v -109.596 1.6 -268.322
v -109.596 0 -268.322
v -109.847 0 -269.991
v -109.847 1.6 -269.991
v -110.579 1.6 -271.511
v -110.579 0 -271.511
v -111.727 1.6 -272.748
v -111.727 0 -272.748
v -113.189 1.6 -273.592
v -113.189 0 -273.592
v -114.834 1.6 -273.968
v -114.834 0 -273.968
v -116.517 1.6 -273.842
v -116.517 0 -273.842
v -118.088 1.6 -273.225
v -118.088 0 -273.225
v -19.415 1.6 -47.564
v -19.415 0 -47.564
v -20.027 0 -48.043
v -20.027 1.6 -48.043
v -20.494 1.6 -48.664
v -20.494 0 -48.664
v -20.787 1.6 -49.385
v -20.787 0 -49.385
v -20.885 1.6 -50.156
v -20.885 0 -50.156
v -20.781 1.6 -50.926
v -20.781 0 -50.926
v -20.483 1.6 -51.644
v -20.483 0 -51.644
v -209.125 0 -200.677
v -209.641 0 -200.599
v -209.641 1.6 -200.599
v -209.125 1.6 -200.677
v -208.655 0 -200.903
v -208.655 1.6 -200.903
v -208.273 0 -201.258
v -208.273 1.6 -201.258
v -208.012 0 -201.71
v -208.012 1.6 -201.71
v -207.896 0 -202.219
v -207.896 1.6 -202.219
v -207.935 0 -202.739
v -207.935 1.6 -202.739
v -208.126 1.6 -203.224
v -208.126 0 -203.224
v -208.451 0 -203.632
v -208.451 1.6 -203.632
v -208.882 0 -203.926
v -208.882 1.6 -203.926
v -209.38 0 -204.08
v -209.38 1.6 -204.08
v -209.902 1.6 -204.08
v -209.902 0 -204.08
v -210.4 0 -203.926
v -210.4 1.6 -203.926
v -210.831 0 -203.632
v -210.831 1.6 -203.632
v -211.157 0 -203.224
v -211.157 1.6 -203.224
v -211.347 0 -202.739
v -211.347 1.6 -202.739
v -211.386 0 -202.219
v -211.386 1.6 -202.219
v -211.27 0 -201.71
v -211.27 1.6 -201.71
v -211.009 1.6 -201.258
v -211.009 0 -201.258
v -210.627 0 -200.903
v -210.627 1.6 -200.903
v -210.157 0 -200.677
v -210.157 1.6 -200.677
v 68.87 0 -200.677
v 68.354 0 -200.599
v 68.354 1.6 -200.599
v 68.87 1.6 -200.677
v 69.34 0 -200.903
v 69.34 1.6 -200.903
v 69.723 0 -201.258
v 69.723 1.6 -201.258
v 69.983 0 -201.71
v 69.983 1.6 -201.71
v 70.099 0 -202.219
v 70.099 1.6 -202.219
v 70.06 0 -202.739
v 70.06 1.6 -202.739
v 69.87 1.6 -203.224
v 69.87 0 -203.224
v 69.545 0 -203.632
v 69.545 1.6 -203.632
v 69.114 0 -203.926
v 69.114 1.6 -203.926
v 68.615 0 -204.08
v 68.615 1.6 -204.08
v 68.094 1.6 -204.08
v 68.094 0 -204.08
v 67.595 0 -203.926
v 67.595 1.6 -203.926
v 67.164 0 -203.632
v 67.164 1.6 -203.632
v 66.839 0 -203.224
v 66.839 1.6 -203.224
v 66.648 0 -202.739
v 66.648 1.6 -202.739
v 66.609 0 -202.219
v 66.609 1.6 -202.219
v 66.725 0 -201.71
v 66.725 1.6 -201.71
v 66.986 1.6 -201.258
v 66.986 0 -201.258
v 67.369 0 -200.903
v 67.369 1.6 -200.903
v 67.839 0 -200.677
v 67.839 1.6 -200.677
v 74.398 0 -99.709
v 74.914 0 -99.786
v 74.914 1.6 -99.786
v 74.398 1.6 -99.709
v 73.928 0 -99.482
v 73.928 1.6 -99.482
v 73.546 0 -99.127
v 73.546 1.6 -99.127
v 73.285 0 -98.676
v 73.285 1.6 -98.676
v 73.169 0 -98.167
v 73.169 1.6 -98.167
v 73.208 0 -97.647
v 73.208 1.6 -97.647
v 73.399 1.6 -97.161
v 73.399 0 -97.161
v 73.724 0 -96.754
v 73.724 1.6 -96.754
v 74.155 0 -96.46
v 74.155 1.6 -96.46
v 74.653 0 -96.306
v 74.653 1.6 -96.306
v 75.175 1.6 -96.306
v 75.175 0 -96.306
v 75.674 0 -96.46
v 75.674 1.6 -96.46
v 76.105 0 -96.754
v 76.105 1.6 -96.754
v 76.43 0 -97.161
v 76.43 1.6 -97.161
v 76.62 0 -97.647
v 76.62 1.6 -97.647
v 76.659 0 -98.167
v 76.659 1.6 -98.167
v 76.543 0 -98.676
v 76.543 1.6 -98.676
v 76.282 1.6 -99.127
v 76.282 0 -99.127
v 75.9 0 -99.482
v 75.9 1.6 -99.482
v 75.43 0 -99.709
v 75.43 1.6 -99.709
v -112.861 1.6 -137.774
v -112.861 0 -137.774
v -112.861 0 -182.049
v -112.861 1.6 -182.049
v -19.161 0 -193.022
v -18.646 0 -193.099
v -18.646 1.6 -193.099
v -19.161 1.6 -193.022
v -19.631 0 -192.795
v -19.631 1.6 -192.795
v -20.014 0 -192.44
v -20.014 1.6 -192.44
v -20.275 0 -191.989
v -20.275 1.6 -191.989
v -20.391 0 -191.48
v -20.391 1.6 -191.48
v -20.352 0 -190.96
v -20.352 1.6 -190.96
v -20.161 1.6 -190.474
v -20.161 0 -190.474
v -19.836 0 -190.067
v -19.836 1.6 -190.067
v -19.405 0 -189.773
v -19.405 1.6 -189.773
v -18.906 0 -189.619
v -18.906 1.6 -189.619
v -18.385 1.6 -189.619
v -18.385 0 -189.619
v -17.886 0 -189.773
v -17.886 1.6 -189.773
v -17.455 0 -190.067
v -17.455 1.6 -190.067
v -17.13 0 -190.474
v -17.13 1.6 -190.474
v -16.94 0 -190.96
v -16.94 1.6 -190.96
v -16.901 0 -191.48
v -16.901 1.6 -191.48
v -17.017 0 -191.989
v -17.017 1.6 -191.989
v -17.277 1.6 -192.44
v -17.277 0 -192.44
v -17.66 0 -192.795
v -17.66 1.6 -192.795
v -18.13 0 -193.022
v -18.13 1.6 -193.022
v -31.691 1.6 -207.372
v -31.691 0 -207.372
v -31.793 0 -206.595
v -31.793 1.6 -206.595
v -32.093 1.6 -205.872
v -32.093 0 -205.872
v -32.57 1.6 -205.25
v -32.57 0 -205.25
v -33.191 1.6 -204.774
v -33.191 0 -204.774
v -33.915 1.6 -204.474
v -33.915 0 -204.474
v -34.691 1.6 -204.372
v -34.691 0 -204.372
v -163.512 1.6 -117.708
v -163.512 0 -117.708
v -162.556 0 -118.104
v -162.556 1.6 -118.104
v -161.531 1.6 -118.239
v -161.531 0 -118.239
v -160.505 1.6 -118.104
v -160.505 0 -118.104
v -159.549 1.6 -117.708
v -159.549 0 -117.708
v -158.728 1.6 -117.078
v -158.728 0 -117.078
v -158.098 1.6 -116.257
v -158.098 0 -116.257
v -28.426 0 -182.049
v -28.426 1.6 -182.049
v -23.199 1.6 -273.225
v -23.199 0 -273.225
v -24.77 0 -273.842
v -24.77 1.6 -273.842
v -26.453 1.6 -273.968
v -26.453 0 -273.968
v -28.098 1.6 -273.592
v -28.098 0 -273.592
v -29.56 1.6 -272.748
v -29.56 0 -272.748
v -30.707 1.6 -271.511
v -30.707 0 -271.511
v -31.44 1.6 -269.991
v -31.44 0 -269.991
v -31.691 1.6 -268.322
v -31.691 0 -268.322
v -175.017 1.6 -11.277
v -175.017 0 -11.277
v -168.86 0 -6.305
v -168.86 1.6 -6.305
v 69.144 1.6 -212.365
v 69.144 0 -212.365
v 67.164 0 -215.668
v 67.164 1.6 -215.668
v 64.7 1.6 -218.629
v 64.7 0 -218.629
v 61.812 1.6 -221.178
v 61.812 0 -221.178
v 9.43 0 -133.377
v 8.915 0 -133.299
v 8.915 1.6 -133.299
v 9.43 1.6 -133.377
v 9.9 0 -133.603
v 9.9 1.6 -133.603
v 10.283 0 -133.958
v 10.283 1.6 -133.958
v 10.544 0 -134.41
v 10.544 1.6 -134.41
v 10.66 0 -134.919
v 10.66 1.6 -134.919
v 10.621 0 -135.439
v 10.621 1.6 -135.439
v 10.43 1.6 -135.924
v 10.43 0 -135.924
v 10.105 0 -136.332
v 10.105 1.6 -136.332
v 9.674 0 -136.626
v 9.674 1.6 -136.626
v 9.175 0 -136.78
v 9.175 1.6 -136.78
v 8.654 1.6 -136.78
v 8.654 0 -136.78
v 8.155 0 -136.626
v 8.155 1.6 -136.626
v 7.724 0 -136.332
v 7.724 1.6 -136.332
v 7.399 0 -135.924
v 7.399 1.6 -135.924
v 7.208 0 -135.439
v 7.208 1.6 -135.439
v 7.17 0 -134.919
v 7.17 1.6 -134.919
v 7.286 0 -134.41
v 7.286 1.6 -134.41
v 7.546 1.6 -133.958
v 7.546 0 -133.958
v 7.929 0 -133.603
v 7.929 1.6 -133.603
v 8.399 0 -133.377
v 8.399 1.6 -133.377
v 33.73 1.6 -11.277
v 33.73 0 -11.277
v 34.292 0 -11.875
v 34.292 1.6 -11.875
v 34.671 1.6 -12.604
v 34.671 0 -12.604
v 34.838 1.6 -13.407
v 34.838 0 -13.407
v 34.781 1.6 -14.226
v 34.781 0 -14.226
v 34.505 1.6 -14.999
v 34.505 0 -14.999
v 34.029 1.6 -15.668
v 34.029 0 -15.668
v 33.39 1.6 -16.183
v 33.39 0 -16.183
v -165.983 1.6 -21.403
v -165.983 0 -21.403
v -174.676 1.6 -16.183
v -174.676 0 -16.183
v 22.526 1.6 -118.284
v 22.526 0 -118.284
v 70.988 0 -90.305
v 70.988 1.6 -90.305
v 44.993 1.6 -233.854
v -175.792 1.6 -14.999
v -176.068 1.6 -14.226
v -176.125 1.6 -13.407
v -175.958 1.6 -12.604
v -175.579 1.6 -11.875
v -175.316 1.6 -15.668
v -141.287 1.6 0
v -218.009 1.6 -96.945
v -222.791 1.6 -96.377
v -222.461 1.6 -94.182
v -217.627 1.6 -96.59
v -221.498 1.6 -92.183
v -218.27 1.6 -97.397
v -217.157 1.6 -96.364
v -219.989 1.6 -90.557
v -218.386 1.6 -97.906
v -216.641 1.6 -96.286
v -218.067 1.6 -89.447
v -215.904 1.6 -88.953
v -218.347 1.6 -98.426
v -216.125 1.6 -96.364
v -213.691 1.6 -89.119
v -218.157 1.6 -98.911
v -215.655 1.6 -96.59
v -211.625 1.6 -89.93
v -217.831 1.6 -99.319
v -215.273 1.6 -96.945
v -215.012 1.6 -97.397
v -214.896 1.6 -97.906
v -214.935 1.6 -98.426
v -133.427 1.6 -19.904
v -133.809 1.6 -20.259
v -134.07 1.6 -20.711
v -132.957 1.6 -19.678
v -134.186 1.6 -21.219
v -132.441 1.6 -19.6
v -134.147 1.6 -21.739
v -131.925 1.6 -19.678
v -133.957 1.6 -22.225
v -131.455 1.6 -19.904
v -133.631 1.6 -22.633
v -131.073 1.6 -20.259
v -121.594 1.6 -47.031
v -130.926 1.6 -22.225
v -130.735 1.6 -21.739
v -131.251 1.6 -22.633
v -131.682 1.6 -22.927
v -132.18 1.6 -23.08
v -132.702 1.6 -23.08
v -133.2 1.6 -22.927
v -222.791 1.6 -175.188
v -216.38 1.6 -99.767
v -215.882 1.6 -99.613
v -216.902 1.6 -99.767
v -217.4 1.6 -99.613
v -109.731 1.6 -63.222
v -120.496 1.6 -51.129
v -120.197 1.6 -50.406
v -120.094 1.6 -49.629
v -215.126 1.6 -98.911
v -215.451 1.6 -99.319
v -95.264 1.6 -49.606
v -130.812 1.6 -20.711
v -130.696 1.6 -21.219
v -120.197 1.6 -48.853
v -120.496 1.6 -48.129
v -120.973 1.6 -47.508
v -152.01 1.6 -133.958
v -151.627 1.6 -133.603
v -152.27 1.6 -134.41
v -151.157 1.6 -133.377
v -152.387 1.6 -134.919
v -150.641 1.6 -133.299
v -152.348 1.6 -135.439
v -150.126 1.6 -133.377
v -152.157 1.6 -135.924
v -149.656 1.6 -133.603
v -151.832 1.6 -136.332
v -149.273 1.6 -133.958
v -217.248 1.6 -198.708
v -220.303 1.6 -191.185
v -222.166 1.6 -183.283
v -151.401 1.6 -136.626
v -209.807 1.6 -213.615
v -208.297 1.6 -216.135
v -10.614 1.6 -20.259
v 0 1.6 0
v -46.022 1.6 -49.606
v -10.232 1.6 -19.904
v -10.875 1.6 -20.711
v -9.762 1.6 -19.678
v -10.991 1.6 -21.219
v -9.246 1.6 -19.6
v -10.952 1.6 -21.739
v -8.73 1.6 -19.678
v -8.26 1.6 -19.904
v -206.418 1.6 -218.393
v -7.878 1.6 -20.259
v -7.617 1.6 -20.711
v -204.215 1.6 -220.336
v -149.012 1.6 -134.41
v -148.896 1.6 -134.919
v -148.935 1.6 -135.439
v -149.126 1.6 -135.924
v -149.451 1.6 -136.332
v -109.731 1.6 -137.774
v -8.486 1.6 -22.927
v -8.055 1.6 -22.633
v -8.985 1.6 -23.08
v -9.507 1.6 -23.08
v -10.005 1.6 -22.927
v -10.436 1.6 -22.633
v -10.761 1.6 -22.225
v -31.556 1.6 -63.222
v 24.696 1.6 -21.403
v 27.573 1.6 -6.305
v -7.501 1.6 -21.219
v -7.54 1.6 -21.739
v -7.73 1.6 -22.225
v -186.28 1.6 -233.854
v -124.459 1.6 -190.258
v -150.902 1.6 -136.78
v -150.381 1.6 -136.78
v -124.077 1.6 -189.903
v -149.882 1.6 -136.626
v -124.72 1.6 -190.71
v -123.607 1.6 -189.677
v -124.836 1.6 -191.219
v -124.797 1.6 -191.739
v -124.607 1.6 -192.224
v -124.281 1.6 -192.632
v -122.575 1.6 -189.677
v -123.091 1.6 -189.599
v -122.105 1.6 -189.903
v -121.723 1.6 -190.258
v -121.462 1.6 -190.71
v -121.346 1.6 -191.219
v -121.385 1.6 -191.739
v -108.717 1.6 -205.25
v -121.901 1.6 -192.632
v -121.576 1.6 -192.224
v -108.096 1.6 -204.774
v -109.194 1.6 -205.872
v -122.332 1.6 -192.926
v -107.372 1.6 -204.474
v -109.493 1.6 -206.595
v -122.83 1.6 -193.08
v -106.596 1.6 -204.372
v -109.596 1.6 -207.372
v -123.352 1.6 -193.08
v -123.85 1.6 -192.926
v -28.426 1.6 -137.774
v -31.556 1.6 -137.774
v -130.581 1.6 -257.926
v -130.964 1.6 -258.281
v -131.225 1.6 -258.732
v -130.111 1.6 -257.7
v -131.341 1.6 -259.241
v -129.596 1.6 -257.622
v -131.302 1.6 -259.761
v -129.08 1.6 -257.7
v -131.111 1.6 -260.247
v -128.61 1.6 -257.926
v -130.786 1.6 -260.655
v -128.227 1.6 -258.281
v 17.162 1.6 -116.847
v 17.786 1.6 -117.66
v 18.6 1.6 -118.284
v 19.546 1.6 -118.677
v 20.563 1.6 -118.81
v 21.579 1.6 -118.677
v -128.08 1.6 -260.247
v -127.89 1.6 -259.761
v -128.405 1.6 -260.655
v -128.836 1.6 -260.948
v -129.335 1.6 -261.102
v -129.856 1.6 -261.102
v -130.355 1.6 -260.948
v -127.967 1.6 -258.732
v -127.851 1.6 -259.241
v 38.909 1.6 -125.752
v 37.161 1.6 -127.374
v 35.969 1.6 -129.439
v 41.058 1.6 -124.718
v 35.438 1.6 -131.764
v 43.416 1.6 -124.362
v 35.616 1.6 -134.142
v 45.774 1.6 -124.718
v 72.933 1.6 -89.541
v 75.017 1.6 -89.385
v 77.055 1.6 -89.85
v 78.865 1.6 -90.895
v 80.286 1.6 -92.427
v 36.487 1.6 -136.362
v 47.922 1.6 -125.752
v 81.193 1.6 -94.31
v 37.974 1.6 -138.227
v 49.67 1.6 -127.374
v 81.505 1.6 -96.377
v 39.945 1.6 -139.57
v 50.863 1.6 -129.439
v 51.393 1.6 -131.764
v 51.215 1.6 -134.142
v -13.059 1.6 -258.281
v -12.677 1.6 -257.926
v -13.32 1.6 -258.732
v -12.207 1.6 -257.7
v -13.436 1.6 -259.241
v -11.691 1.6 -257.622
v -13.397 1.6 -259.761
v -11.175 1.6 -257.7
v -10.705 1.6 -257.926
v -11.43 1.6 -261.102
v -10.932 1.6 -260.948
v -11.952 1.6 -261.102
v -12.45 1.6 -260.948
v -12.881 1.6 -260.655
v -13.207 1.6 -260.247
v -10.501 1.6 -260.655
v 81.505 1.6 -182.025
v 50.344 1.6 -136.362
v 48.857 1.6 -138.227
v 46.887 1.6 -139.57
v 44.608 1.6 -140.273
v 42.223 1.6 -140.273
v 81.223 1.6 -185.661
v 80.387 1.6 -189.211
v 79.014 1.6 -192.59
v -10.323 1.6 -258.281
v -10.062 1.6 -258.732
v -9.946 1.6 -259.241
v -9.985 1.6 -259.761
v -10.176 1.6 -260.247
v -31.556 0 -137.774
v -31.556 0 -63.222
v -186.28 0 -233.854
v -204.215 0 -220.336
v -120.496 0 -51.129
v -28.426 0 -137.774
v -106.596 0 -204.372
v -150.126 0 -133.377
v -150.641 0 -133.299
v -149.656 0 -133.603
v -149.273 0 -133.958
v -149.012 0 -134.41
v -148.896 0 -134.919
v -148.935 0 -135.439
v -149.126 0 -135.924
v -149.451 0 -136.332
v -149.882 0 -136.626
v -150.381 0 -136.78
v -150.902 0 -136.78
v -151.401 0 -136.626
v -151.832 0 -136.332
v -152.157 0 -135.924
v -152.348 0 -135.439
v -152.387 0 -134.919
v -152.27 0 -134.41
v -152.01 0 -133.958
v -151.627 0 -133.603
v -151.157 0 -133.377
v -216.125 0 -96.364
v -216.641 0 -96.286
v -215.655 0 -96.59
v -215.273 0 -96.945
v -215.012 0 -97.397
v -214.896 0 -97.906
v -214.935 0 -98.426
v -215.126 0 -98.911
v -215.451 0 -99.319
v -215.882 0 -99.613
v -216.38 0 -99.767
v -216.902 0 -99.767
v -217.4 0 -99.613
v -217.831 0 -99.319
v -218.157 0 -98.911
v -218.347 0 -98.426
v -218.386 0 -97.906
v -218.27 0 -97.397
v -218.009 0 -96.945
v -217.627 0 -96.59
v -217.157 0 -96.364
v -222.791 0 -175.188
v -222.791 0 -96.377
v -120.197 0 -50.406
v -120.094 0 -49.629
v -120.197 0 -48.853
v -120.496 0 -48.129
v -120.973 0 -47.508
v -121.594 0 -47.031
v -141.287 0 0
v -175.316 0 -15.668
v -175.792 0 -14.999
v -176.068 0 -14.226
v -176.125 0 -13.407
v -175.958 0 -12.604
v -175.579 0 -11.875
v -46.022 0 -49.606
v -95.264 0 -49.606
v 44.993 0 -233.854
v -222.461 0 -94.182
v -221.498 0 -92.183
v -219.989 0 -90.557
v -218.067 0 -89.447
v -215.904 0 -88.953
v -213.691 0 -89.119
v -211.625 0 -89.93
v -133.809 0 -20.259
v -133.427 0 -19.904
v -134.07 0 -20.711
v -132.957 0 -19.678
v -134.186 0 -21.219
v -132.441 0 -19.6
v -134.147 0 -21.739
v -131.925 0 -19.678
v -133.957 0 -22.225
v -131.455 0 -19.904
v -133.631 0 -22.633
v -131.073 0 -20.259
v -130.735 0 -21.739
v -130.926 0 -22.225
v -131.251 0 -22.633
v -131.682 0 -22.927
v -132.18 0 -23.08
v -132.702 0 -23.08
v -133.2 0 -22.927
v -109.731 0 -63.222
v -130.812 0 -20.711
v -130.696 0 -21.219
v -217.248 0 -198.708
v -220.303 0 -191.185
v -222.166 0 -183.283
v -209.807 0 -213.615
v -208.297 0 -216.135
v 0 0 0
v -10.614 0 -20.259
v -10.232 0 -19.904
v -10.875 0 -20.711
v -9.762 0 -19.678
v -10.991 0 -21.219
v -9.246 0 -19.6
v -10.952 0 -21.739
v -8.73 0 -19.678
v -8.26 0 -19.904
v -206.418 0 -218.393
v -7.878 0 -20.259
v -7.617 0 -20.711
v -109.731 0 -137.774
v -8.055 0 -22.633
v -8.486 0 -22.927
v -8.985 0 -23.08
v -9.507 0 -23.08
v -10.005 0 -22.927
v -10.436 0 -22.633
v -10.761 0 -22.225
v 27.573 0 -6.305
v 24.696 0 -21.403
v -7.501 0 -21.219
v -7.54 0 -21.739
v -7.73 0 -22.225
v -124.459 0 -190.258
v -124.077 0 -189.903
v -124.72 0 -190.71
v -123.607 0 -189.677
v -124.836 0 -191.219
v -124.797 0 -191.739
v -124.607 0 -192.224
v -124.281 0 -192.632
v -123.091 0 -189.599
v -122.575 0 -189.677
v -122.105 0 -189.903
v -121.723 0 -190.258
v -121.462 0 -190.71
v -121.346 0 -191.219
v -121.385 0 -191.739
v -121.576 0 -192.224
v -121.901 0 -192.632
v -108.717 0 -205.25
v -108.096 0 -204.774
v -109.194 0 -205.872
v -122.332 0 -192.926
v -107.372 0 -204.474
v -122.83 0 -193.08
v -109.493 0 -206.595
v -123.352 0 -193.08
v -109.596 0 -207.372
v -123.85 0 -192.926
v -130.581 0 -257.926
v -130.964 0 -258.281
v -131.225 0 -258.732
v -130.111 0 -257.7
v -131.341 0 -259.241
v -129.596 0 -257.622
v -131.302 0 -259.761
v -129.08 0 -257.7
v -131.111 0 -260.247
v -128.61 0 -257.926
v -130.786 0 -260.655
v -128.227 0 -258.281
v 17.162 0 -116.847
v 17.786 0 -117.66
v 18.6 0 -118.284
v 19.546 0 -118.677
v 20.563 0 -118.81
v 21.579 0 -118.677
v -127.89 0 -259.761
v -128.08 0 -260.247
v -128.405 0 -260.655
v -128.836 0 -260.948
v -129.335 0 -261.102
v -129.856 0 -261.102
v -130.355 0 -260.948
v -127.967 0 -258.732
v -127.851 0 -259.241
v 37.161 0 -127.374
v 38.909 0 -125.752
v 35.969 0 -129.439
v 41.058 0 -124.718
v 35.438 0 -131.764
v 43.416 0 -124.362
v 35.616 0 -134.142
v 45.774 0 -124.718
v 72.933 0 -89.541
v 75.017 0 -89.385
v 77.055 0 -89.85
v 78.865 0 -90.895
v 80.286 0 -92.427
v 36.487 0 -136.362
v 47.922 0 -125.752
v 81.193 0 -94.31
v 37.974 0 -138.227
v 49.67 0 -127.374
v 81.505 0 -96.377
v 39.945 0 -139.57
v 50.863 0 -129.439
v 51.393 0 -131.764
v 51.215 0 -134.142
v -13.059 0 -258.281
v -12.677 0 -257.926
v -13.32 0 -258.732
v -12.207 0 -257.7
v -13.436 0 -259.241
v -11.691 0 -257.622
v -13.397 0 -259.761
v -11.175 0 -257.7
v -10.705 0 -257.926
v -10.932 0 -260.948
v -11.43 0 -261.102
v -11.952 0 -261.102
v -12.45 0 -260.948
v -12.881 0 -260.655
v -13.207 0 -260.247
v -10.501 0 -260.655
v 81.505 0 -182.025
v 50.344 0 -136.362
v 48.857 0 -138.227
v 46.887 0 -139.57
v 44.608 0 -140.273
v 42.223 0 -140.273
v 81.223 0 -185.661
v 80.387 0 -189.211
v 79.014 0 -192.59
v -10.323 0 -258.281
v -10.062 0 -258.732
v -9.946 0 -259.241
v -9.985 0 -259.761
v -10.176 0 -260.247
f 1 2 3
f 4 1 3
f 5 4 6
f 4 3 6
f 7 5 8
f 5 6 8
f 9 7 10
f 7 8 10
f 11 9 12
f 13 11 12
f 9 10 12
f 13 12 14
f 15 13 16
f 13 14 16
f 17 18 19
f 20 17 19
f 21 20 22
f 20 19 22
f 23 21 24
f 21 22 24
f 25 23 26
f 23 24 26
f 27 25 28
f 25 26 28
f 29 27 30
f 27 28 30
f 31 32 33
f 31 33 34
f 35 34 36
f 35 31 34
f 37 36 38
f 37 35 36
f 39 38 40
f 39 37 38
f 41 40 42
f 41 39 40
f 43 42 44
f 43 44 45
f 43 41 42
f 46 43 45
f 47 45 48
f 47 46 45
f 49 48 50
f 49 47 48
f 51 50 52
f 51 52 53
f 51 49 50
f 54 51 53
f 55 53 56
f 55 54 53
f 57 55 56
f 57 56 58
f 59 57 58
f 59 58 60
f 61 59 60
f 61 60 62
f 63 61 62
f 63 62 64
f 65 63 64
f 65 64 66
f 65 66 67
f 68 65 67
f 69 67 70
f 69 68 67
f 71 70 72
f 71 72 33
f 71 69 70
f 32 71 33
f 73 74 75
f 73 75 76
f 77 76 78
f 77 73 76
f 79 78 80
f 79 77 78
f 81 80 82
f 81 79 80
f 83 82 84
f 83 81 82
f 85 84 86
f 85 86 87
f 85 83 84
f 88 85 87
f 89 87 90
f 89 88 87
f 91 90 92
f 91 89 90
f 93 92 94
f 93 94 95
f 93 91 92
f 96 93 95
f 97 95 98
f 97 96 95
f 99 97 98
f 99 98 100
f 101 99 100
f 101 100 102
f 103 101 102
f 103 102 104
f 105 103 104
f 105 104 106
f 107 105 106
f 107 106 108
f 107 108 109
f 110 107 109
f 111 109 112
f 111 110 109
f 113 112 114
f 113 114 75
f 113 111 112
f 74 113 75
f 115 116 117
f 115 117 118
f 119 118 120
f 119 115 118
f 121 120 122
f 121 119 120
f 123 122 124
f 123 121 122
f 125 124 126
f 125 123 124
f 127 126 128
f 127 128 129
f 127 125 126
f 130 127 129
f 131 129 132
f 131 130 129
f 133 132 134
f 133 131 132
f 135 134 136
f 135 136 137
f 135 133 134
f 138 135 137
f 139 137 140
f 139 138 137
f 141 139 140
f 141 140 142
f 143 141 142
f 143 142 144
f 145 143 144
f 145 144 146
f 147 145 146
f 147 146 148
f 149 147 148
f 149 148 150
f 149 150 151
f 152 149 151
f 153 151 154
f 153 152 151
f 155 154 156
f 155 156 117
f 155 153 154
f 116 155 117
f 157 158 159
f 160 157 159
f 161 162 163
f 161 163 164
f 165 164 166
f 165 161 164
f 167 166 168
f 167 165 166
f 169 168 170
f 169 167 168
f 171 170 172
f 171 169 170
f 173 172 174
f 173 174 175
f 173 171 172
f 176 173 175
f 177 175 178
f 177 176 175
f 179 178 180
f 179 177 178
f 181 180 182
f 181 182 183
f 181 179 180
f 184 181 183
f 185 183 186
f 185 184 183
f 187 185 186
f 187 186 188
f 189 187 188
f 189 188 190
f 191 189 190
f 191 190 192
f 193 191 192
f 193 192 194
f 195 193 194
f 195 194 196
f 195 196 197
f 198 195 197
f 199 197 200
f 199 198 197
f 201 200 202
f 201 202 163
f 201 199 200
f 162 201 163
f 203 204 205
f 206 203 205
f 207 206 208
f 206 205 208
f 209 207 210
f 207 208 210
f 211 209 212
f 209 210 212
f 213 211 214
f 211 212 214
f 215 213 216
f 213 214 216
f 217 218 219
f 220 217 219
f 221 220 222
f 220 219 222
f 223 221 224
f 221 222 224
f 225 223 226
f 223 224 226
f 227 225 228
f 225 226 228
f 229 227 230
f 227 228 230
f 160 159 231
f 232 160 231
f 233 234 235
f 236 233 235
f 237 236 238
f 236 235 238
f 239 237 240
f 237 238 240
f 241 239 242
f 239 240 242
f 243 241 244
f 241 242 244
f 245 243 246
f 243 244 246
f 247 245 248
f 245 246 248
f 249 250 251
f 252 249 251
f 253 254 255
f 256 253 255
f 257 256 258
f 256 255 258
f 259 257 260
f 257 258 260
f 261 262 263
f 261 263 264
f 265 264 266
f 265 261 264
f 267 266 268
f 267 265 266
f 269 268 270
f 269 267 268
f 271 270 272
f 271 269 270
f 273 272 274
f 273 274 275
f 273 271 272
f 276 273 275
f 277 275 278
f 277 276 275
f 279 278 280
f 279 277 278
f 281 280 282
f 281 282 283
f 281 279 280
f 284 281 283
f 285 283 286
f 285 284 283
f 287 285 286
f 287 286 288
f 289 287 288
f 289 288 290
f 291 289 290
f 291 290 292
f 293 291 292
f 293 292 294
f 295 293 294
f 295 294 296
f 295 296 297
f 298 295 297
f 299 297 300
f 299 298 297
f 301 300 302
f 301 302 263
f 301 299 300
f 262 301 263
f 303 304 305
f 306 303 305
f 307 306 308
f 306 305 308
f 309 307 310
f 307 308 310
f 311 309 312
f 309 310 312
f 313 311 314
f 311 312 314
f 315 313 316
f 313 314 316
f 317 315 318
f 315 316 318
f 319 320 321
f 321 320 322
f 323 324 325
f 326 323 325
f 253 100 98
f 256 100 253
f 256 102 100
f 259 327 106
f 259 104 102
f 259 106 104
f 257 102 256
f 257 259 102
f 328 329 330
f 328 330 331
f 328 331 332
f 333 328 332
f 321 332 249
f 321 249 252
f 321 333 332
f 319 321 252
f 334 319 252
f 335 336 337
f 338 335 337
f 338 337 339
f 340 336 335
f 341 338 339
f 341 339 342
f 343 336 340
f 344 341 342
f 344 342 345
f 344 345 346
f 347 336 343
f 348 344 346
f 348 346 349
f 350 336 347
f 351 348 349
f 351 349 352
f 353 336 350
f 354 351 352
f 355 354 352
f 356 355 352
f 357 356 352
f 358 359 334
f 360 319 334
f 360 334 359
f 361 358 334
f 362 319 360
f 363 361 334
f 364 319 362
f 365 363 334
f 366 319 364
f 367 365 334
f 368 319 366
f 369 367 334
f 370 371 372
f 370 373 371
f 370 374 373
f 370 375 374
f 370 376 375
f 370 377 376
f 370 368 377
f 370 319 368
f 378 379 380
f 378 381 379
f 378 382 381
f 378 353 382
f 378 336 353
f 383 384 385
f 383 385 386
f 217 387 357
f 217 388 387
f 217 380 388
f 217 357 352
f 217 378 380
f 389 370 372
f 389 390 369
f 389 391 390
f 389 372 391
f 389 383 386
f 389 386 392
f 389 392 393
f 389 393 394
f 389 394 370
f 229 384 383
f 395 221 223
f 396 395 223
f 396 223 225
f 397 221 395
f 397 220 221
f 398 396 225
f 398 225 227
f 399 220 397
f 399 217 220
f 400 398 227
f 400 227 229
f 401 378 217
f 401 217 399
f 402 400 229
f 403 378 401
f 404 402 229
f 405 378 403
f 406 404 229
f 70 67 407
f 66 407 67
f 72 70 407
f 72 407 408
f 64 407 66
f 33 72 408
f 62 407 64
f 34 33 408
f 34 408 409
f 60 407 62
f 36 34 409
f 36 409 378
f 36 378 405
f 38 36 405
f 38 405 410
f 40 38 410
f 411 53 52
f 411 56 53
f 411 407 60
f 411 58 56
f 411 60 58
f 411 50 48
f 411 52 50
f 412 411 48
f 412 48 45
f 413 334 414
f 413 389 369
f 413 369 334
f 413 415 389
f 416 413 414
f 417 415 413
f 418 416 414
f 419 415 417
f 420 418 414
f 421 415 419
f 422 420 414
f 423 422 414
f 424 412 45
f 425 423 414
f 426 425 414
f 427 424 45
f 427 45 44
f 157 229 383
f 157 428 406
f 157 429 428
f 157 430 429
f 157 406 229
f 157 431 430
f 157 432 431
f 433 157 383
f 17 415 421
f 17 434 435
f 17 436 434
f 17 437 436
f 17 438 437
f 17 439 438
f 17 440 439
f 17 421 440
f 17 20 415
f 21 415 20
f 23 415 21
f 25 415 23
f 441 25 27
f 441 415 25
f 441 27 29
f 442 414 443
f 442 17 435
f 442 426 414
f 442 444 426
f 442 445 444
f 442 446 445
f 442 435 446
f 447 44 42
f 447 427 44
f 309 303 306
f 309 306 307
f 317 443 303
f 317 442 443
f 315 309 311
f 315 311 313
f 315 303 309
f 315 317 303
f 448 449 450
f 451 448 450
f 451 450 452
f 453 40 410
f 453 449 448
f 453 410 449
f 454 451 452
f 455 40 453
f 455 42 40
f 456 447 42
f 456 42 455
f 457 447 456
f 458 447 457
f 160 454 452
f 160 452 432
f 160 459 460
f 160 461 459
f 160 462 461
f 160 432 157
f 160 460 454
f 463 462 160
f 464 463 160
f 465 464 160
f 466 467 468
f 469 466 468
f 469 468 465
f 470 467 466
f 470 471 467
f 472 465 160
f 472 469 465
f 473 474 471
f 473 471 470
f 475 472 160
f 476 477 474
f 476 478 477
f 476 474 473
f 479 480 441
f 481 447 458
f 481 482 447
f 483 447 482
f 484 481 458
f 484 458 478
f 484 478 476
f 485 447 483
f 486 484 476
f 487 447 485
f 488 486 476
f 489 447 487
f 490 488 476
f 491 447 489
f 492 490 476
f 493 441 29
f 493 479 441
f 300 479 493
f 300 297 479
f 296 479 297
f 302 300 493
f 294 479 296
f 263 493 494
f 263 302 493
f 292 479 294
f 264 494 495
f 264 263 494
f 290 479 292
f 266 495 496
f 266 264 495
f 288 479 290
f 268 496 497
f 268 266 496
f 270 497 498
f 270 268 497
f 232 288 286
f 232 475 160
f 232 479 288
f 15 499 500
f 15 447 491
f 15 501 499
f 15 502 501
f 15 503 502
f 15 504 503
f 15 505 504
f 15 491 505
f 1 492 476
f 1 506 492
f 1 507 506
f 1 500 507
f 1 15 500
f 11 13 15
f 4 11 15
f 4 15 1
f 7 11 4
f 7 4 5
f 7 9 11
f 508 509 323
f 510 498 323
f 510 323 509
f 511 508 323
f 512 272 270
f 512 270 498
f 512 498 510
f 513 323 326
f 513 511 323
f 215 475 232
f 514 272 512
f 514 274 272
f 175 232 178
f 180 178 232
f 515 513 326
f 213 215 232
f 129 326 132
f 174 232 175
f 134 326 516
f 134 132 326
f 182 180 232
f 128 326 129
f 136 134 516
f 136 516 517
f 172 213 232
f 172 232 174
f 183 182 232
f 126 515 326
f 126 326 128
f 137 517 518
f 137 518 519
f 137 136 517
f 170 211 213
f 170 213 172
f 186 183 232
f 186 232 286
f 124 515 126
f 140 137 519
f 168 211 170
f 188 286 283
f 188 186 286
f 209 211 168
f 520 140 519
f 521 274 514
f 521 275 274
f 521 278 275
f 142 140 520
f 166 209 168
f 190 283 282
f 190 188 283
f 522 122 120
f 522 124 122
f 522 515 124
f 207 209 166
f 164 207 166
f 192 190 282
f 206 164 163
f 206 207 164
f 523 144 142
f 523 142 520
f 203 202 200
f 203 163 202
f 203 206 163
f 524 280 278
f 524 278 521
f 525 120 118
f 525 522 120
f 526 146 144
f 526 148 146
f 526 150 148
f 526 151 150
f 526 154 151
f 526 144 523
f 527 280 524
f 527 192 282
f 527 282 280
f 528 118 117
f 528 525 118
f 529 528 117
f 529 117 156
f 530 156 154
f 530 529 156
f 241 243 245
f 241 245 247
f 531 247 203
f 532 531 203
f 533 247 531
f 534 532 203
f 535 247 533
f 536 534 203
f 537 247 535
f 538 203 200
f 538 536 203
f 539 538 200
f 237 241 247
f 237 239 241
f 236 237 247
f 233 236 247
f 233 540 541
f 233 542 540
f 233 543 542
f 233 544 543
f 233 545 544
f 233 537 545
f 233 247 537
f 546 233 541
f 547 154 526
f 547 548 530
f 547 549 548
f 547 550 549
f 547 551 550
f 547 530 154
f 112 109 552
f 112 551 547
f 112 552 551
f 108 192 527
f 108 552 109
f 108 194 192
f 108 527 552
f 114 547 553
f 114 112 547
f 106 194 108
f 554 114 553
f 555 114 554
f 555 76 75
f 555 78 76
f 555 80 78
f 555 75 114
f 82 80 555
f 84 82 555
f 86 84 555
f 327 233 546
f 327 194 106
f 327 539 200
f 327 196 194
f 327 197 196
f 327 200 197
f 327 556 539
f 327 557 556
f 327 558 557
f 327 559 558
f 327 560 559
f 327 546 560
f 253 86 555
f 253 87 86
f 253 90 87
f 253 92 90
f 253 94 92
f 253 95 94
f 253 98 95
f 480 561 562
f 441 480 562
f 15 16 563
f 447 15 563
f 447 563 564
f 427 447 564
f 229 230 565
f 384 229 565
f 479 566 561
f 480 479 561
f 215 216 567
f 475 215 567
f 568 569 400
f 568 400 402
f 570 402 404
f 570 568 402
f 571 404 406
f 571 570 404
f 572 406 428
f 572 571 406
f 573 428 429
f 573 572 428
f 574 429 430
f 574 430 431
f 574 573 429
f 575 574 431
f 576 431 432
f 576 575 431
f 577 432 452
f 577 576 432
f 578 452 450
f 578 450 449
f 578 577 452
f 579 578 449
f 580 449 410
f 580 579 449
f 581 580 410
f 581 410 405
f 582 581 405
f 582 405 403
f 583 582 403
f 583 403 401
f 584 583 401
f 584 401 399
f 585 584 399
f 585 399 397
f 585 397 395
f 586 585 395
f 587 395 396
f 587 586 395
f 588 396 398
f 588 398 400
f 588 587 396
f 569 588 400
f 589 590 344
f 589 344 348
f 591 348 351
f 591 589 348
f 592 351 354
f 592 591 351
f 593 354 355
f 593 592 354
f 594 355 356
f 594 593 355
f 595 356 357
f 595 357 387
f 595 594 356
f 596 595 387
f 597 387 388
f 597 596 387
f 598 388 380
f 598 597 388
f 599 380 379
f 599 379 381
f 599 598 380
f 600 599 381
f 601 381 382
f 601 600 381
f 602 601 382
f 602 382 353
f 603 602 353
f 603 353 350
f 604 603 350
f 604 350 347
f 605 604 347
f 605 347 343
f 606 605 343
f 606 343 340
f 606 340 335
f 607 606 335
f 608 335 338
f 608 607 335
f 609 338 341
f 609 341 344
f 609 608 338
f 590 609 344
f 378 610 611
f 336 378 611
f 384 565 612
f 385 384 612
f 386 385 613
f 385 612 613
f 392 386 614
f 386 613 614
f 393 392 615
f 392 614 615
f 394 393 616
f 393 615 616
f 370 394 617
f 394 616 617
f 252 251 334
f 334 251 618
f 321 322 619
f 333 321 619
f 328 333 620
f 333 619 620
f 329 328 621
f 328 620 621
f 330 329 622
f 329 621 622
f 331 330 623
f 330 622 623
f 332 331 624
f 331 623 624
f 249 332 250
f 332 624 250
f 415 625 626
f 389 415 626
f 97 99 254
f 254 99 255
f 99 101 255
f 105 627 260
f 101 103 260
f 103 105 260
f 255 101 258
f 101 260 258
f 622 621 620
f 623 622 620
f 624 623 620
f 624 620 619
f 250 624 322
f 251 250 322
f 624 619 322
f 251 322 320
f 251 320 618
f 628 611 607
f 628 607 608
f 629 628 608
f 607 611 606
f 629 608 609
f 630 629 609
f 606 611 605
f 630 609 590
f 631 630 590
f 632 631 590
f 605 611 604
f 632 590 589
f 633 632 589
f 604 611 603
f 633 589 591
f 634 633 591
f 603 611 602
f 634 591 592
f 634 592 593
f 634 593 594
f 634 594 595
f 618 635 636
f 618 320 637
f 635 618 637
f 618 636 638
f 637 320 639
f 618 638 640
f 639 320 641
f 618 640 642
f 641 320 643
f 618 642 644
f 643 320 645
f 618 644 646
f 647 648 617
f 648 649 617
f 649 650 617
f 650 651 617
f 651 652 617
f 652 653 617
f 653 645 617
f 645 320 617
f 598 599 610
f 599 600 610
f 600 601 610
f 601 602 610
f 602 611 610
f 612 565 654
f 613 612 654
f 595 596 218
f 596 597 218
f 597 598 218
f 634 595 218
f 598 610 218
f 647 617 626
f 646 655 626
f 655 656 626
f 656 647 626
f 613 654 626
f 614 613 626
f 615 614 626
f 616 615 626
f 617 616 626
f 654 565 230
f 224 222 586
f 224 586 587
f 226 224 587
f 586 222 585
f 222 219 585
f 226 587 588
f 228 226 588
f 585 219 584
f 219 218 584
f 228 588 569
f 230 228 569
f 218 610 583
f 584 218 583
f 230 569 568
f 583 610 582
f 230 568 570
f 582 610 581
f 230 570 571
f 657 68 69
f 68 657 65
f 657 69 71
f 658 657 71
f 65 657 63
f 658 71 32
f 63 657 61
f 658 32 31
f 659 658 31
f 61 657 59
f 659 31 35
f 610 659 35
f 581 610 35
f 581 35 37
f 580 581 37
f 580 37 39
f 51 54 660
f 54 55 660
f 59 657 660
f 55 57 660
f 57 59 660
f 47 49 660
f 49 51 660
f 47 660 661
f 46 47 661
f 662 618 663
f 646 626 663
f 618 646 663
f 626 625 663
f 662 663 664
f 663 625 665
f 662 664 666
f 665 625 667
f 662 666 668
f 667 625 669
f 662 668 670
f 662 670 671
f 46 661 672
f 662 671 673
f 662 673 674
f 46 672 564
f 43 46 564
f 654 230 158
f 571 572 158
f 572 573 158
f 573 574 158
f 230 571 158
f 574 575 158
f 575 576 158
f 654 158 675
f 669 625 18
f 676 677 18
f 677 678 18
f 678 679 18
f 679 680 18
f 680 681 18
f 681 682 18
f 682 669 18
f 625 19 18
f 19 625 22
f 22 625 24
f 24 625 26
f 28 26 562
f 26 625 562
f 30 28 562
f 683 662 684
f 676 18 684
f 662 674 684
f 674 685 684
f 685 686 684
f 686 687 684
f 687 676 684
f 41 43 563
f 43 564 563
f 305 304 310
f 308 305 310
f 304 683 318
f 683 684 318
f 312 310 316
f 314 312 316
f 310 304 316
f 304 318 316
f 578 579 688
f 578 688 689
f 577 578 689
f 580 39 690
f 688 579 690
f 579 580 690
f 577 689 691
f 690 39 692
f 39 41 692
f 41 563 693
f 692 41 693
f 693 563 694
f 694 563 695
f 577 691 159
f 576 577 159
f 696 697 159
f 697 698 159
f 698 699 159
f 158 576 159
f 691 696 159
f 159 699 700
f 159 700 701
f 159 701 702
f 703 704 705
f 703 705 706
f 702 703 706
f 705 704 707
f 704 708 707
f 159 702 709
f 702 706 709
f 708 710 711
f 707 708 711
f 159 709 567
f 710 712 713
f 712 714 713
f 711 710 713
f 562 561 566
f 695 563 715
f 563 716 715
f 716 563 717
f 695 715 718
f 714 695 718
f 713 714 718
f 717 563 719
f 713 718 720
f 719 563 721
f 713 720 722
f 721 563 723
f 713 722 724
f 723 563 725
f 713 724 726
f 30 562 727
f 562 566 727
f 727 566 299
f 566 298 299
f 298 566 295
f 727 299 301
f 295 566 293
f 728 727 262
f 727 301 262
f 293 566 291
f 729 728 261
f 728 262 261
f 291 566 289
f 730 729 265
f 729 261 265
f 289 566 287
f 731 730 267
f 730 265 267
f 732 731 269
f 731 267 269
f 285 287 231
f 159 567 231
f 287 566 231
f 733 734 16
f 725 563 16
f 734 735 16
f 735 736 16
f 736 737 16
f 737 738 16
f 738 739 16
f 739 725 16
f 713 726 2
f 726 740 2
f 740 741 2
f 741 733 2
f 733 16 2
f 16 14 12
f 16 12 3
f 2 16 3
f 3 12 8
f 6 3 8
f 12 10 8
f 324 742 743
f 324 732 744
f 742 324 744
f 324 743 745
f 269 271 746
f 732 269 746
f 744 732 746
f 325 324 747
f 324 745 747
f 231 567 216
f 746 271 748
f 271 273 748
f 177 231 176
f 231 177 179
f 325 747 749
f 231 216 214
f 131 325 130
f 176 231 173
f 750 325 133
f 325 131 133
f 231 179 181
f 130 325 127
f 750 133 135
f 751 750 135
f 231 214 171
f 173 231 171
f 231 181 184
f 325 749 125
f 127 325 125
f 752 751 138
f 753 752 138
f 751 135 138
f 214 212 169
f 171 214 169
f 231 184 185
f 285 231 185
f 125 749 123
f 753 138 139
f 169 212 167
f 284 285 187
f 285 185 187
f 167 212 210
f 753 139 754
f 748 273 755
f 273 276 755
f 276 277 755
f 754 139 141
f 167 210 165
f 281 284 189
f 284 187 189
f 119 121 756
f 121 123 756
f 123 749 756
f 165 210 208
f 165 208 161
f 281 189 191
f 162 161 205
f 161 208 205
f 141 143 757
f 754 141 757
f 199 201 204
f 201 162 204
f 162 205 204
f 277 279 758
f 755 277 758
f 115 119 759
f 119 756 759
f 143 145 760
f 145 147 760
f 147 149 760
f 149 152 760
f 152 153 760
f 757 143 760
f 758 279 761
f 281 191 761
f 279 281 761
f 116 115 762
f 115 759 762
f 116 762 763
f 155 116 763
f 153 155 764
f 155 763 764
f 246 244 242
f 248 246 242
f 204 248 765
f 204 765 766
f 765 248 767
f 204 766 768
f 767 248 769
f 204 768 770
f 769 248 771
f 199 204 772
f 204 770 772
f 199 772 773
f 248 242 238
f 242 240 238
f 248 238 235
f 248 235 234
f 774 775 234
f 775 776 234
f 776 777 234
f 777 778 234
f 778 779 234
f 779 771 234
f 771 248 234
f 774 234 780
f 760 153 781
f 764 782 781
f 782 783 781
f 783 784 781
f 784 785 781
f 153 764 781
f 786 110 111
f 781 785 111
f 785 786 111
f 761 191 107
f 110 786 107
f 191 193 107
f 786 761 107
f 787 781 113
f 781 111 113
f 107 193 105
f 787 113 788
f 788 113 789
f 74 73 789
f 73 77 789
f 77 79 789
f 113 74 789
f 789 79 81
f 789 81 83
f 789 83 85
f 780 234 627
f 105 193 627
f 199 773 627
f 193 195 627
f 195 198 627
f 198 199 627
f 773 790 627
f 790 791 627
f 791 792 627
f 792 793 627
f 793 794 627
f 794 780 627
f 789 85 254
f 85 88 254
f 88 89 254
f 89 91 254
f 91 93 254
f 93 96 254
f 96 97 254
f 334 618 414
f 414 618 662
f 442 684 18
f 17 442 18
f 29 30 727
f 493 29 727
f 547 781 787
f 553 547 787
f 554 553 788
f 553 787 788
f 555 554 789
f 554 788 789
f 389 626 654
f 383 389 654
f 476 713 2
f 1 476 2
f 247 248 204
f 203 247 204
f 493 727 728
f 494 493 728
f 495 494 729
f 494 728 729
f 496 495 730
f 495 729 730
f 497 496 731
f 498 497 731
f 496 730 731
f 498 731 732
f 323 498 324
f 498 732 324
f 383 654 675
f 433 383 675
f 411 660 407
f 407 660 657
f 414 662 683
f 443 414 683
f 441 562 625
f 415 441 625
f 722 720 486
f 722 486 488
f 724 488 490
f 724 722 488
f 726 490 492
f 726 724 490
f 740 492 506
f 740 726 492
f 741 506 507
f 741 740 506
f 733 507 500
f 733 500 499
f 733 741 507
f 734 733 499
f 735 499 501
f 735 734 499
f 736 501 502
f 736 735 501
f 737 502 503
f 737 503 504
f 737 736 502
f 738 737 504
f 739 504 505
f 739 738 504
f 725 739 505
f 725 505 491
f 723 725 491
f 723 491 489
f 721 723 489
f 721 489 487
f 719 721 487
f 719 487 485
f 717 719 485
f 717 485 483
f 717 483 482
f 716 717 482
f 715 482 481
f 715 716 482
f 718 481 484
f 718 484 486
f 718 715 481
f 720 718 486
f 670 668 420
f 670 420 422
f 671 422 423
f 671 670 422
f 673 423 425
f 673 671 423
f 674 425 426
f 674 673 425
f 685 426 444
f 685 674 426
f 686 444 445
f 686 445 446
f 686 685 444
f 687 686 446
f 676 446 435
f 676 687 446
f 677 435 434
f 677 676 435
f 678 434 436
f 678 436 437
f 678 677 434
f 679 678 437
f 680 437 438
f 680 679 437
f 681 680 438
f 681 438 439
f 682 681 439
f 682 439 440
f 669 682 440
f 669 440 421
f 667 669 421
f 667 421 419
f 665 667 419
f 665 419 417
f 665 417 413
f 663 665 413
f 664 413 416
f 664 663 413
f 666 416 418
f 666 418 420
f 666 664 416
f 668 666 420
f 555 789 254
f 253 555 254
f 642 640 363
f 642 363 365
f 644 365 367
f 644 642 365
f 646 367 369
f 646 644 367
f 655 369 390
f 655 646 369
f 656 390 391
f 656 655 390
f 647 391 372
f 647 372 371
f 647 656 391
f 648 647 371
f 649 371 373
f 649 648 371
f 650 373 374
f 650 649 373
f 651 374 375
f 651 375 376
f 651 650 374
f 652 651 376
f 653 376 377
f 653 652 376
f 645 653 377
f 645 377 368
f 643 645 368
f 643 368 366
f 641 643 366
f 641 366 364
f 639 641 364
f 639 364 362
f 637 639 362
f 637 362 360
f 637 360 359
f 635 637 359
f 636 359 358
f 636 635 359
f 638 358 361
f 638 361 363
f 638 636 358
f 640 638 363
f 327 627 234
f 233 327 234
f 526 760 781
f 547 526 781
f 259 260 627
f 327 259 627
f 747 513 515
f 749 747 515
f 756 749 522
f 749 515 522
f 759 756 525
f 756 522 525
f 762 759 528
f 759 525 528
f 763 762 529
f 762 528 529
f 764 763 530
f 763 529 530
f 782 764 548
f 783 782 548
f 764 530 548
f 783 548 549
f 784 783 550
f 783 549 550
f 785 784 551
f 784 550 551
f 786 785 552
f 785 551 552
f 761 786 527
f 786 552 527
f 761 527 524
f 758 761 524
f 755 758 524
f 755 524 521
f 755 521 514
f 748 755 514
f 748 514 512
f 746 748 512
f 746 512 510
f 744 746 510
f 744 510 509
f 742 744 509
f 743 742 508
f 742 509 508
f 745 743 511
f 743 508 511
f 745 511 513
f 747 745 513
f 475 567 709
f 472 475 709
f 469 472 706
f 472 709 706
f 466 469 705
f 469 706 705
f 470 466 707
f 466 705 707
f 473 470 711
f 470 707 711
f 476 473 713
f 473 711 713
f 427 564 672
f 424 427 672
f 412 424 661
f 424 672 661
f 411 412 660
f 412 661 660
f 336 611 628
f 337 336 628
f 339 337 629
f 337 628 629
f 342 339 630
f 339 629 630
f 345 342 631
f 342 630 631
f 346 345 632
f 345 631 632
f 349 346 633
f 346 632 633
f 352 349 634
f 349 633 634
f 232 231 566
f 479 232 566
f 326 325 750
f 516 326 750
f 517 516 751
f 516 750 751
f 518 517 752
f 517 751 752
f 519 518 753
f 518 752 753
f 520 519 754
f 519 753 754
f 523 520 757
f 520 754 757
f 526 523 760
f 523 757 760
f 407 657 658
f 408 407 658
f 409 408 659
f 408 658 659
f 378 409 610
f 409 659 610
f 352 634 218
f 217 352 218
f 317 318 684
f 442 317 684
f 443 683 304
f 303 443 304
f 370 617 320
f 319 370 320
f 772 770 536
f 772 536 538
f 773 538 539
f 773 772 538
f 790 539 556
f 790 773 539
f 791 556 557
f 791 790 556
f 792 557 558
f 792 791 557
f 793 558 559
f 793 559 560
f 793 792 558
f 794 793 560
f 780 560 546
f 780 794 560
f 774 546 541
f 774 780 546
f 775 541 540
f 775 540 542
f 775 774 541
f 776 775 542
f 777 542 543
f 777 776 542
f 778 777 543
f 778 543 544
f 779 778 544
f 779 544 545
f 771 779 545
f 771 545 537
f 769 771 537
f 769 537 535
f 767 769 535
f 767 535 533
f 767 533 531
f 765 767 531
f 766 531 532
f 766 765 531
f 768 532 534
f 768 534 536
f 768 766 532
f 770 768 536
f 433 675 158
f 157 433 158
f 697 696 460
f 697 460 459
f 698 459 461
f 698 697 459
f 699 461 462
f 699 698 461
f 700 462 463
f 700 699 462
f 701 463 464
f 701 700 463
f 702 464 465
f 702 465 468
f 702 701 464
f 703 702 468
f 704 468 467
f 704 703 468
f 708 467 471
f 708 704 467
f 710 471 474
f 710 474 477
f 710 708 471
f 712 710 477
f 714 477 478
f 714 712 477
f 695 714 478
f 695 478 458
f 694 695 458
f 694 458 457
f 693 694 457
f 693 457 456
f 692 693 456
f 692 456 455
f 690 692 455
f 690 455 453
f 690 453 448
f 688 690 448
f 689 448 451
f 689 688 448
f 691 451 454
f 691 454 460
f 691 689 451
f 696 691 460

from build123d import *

# Parameters (mm, degrees)
SKETCH1_R           = 1.75
BOSS_EXTRUDE1_DEPTH = 1.6
SKETCH3_R           = 8
CUT_EXTRUDE1_DEPTH  = 1.6


with BuildPart() as part:
    # Sketch1 → Boss-Extrude1 (new body)
    with BuildSketch(Plane(origin=(0, 0, 0), x_dir=(1, 0, 0), z_dir=(0, 1, 0))):
        with BuildLine():
            Line((24.696313384, 21.403189927), (-19.414899465, 47.563680085))
            ThreePointArc((-19.414899465, 47.563680085), (-20.786874634, 49.384536896), (-20.482680557, 51.644028288))
            Line((-20.482680557, 51.644028288), (17.162414168, 116.847245007))
            ThreePointArc((17.162414168, 116.847245007), (19.546471274, 118.676596366), (22.525800971, 118.28436017))
            Line((22.525800971, 118.28436017), (70.987796177, 90.304814192))
            ThreePointArc((70.987796177, 90.304814192), (77.999004119, 90.304814192), (81.50460809, 96.376698381))
            Line((81.50460809, 96.376698381), (81.50460809, 182.02519482))
            ThreePointArc((81.50460809, 182.02519482), (80.873629228, 187.452491566), (79.01435205, 192.590270527))
            Line((79.01435205, 192.590270527), (69.144094326, 212.364639151))
            ThreePointArc((69.144094326, 212.364639151), (65.989183491, 217.196365343), (61.81193417, 221.177524531))
            Line((61.81193417, 221.177524531), (44.99314954, 233.854205885))
            Line((44.99314954, 233.854205885), (-23.199197227, 273.225075648))
            ThreePointArc((-23.199197227, 273.225075648), (-28.860512938, 273.225075648), (-31.691170793, 268.322232423))
            Line((-31.691170793, 268.322232423), (-31.691170793, 207.371759387))
            ThreePointArc((-31.691170793, 207.371759387), (-32.56985045, 205.250439044), (-34.691170793, 204.371759387))
            Line((-34.691170793, 204.371759387), (-106.595635326, 204.371759387))
            ThreePointArc((-106.595635326, 204.371759387), (-108.71695567, 205.250439044), (-109.595635326, 207.371759387))
            Line((-109.595635326, 207.371759387), (-109.595635326, 268.322232423))
            ThreePointArc((-109.595635326, 268.322232423), (-112.426293182, 273.225075648), (-118.087608892, 273.225075648))
            Line((-118.087608892, 273.225075648), (-186.279955659, 233.854205885))
            Line((-186.279955659, 233.854205885), (-204.21495553, 220.336208987))
            ThreePointArc((-204.21495553, 220.336208987), (-207.400637767, 217.300070339), (-209.806657286, 213.615266508))
            Line((-209.806657286, 213.615266508), (-217.247579174, 198.707901735))
            ThreePointArc((-217.247579174, 198.707901735), (-221.386722215, 187.270122423), (-222.791414209, 175.187815477))
            Line((-222.791414209, 175.187815477), (-222.791414209, 96.376698381))
            ThreePointArc((-222.791414209, 96.376698381), (-219.069332913, 89.929864467), (-211.625170321, 89.929864467))
            Line((-211.625170321, 89.929864467), (-163.512384372, 117.707794386))
            ThreePointArc((-163.512384372, 117.707794386), (-160.504762554, 118.10375531), (-158.098066116, 116.257032182))
            Line((-158.098066116, 116.257032182), (-120.496410943, 51.129054973))
            ThreePointArc((-120.496410943, 51.129054973), (-120.196709676, 48.852597838), (-121.594487155, 47.030978762))
            Line((-121.594487155, 47.030978762), (-165.983119503, 21.403189927))
            Line((-165.983119503, 21.403189927), (-174.676412504, 16.182853027))
            ThreePointArc((-174.676412504, 16.182853027), (-176.124776412, 13.818668342), (-175.016914475, 11.277060748))
            Line((-175.016914475, 11.277060748), (-168.860075369, 6.304549502))
            Line((-168.860075369, 6.304549502), (-141.286806119, 0))
            Line((-141.286806119, 0), (0, 0))
            Line((0, 0), (27.57326925, 6.304549502))
            Line((27.57326925, 6.304549502), (33.730108356, 11.277060748))
            ThreePointArc((33.730108356, 11.277060748), (34.837970293, 13.818668342), (33.389606385, 16.182853027))
            Line((33.389606385, 16.182853027), (24.696313384, 21.403189927))
        make_face()
        with Locations(Location((-123.091146174, 191.349343748, 0), (0, 0, 270))):
            Circle(SKETCH1_R, mode=Mode.SUBTRACT)
        with Locations(Location((-216.641081117, 98.036380822, 0), (0, 0, 270))):
            Circle(SKETCH1_R, mode=Mode.SUBTRACT)
        with Locations(Location((-18.645659945, 191.349343748, 0), (0, 0, 90))):
            Circle(SKETCH1_R, mode=Mode.SUBTRACT)
        with Locations(Location((74.914274997, 98.036380822, 0), (0, 0, 90))):
            Circle(SKETCH1_R, mode=Mode.SUBTRACT)
        with Locations(Location((-9.245725003, 21.35, 0), (0, 0, 270))):
            Circle(SKETCH1_R, mode=Mode.SUBTRACT)
        with Locations(Location((-132.441081117, 21.35, 0), (0, 0, 270))):
            Circle(SKETCH1_R, mode=Mode.SUBTRACT)
        with Locations(Location((-150.641414209, 135.049343748, 0), (0, 0, 270))):
            Circle(SKETCH1_R, mode=Mode.SUBTRACT)
        with Locations(Location((8.91460809, 135.049343748, 0), (0, 0, 270))):
            Circle(SKETCH1_R, mode=Mode.SUBTRACT)
        with Locations(Location((68.354340055, 202.349343748, 0), (0, 0, 270))):
            Circle(SKETCH1_R, mode=Mode.SUBTRACT)
        with Locations(Location((-11.691170793, 259.371759387, 0), (0, 0, 270))):
            Circle(SKETCH1_R, mode=Mode.SUBTRACT)
        with Locations(Location((-129.595635326, 259.371759387, 0), (0, 0, 270))):
            Circle(SKETCH1_R, mode=Mode.SUBTRACT)
        with Locations(Location((-209.641146174, 202.349343748, 0), (0, 0, 270))):
            Circle(SKETCH1_R, mode=Mode.SUBTRACT)
        Polygon((-31.555725003, 63.222149708), (-46.022445575, 49.606380822), (-95.264360544, 49.606380822), (-109.731081117, 63.222149708), (-109.731081117, 137.774232151), (-112.861146174, 137.774232151), (-112.861146174, 182.049343748), (-28.425659945, 182.049343748), (-28.425659945, 137.774232151), (-31.555725003, 137.774232151), align=None, mode=Mode.SUBTRACT)
    extrude(amount=BOSS_EXTRUDE1_DEPTH)

    # Sketch3 → Cut-Extrude1 (cut)
    with BuildSketch(Plane(origin=(0, 1.6, 0), x_dir=(1, 0, 0), z_dir=(0, 1, 0))):
        with Locations(Location((43.415663258, 132.362201431, 0), (0, 0, 270))):
            Circle(SKETCH3_R)
    extrude(amount=-CUT_EXTRUDE1_DEPTH, mode=Mode.SUBTRACT)


solid = part.part
